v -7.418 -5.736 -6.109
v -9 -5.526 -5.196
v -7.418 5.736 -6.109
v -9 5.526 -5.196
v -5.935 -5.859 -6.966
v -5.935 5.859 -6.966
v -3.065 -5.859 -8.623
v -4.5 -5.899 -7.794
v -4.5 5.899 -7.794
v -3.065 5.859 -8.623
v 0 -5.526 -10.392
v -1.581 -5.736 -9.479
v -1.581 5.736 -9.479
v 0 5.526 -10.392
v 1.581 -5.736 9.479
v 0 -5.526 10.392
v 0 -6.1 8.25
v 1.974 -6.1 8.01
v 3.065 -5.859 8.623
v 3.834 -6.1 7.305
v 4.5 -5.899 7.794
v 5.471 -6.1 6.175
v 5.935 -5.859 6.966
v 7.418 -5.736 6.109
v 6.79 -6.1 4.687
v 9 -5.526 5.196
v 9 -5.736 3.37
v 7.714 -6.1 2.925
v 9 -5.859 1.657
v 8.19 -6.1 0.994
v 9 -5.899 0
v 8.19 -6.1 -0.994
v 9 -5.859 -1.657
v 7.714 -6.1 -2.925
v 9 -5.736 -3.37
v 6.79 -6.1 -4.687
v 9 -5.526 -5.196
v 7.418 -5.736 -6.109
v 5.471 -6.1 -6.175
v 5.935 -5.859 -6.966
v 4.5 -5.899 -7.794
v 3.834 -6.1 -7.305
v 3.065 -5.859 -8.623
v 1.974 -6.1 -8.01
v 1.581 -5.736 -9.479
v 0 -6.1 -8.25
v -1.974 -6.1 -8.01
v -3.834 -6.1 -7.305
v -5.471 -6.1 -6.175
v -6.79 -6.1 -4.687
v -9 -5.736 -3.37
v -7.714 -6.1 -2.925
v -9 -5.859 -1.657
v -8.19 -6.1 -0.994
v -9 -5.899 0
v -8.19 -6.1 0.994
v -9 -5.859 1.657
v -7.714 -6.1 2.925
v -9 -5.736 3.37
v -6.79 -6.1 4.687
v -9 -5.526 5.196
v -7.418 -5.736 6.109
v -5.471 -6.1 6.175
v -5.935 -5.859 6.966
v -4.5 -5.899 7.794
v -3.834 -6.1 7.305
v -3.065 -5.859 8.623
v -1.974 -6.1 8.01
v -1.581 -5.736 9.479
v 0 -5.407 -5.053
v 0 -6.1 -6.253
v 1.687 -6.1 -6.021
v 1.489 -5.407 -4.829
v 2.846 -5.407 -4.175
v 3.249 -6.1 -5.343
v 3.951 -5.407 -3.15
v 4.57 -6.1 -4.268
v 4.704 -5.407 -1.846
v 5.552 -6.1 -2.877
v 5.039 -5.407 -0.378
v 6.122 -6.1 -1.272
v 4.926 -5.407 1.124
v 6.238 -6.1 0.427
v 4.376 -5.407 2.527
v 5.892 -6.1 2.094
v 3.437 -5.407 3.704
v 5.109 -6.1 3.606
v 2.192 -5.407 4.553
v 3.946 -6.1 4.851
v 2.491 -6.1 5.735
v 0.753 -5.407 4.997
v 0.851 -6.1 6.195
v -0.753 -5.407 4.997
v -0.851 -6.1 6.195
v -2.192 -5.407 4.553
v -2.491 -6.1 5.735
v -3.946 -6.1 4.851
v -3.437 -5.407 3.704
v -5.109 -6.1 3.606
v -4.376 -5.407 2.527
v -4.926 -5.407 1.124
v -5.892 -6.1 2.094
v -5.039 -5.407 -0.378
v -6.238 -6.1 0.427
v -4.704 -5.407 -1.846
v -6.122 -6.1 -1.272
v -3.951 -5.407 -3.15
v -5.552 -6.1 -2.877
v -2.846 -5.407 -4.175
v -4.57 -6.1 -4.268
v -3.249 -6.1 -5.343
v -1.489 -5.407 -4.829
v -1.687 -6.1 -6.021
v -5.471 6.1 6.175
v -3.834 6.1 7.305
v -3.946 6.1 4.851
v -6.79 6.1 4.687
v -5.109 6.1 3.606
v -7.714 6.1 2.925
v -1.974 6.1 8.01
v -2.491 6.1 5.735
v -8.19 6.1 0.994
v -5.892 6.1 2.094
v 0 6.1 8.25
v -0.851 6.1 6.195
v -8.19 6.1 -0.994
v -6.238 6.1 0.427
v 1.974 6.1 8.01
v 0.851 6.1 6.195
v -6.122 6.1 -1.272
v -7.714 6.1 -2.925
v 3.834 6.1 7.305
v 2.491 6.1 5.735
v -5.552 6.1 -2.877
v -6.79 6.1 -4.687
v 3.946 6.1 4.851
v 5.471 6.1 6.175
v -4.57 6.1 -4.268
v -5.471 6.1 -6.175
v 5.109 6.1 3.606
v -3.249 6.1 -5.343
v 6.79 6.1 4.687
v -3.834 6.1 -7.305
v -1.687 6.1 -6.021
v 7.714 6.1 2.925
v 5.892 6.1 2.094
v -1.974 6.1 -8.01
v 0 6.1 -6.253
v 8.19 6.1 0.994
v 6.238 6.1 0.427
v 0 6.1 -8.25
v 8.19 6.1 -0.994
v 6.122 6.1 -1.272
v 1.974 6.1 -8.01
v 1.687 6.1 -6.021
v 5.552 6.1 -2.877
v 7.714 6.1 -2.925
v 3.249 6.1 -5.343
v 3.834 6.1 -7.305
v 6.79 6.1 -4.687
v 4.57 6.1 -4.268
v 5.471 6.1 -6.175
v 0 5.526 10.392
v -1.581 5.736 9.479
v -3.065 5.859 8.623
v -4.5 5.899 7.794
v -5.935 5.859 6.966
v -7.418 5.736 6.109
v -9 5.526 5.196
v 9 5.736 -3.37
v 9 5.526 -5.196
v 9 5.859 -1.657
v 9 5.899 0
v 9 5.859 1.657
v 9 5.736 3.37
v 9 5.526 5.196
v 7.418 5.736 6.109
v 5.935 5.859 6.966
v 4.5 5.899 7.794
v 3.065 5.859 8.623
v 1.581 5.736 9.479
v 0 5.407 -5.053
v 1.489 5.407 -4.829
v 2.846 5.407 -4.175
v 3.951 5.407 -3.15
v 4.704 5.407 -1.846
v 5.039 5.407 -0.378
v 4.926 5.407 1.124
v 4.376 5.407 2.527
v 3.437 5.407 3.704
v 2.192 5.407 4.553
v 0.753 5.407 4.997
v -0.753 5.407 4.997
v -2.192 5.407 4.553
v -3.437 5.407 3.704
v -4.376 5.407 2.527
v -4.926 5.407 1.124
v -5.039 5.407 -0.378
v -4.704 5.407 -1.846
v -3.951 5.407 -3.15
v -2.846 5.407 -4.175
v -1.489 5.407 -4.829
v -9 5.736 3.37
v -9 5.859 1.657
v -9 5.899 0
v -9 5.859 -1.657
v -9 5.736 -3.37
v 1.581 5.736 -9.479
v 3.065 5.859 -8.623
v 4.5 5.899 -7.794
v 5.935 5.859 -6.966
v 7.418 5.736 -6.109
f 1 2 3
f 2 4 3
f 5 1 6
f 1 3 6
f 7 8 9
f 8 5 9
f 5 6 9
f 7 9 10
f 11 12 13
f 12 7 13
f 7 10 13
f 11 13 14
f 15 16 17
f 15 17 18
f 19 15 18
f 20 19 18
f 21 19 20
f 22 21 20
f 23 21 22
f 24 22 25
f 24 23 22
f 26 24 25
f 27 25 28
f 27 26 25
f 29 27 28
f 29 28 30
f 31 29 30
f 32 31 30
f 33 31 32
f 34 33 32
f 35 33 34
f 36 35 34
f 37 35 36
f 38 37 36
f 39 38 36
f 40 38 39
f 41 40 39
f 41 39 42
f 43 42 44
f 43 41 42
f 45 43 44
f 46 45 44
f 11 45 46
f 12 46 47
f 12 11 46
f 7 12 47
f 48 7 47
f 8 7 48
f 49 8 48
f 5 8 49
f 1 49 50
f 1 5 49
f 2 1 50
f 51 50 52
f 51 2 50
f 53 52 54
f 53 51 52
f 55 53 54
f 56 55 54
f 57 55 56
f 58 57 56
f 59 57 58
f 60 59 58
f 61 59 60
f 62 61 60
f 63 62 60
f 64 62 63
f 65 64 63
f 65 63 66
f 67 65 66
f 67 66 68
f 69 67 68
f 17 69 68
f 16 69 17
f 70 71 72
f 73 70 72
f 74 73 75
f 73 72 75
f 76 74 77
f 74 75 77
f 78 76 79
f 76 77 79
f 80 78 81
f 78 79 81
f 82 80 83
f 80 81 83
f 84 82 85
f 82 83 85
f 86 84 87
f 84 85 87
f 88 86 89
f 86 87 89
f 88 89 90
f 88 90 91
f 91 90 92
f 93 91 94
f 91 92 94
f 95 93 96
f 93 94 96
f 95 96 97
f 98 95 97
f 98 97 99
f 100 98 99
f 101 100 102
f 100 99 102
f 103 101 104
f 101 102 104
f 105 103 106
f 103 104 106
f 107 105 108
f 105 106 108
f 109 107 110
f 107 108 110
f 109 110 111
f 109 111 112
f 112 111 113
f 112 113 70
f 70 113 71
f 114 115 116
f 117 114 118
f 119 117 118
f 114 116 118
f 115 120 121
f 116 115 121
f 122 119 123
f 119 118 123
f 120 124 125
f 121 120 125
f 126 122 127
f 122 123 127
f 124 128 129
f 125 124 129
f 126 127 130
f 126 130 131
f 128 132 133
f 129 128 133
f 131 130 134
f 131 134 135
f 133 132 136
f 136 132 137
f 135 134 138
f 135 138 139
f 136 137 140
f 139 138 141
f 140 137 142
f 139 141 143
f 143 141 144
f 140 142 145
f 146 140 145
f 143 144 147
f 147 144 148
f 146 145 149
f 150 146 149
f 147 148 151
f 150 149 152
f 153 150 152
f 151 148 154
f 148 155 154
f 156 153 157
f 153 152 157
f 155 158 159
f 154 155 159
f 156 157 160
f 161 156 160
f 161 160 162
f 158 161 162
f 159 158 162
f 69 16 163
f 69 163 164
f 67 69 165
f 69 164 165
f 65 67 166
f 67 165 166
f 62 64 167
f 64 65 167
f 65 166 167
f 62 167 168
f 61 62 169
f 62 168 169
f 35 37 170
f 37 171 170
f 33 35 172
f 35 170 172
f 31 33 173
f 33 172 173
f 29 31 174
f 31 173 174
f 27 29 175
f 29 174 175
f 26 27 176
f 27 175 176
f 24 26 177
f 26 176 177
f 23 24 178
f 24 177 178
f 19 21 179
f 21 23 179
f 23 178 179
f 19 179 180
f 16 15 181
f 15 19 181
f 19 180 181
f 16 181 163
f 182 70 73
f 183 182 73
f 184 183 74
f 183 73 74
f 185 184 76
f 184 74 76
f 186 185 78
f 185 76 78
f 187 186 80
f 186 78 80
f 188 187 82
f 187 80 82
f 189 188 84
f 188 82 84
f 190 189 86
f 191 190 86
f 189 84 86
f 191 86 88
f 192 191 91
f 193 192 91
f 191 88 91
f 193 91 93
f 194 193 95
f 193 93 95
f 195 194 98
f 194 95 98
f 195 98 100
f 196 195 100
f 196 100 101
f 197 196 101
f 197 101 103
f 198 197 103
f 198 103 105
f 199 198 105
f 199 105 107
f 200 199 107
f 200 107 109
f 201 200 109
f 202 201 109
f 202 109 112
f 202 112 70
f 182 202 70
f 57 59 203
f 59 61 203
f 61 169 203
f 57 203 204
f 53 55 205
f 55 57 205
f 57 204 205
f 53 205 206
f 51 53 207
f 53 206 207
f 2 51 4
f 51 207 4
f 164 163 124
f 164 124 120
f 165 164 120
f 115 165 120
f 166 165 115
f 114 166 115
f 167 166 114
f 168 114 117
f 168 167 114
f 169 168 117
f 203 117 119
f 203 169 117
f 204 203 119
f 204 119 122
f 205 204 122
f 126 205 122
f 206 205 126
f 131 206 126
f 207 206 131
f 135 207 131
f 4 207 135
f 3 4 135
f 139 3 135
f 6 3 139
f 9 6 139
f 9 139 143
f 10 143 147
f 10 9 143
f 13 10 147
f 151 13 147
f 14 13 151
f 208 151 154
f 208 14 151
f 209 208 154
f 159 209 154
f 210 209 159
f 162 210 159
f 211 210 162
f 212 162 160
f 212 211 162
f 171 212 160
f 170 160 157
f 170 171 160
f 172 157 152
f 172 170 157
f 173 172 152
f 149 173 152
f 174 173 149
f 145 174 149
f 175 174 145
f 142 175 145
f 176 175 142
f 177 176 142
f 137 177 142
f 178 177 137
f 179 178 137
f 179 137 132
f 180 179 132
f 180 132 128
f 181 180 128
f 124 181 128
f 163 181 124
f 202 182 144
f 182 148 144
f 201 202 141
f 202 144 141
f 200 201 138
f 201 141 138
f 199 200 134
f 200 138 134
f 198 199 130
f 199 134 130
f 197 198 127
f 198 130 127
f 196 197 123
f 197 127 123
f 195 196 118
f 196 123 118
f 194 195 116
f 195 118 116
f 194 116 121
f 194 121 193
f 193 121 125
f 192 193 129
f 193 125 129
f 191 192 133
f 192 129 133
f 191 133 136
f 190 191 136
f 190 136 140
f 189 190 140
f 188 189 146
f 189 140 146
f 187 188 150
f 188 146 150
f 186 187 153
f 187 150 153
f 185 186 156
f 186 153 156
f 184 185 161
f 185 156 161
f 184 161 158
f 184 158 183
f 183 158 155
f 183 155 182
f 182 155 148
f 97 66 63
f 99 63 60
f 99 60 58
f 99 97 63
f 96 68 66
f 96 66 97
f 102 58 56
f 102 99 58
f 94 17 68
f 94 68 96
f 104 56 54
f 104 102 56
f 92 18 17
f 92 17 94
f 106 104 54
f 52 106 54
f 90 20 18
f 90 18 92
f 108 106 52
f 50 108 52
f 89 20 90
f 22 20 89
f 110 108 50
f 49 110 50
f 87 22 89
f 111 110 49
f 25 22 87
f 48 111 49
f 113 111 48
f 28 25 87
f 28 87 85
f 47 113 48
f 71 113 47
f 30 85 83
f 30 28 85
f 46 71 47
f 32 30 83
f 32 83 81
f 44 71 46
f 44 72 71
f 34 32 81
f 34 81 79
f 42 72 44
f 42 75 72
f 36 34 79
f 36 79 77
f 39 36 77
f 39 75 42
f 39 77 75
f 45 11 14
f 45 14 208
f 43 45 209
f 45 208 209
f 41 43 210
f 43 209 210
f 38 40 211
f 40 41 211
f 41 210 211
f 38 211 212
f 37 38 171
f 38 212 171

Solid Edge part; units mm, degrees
sketch "Sketch1" plane through (0, 0, 0) normal (0, -1, 0) x (1, 0, 0)
  line L0 (9, 5.1962) -> (0, 10.3923)
  line L1 (0, 10.3923) -> (-9, 5.1962)
  line L2 (-9, 5.1962) -> (-9, -5.1962)
  line L3 (-9, -5.1962) -> (0, -10.3923)
  line L4 (0, -10.3923) -> (9, -5.1962)
  line L5 (9, -5.1962) -> (9, 5.1962)
extrude "Protrusion1" add sketch "Sketch1" along normal mid plane 12.2
sketch "Sketch2" plane through (0, 0, 0) normal (1, 0, 0) x (0, 1, 0)
  line L0 (-6.1, 8.25) -> (-5.526, 10.3923)
revolve "RevolvedCutout1" cut sketch "Sketch2" angle 360 about axis through (0, 0, 0) along (0, -1, 0) material side at (0, -5.8613, 9.3341)
mirror "Mirror1" about plane through (0, 0, 0) normal (0, -1, 0) of "RevolvedCutout1"
hole "孔_7" at (0, -6.1, 0) direction (0, 1, 0) diameter 10.106 end up to next start chamfer 1.2 start chamfer angle 60 end chamfer 1.2 end chamfer angle 60
